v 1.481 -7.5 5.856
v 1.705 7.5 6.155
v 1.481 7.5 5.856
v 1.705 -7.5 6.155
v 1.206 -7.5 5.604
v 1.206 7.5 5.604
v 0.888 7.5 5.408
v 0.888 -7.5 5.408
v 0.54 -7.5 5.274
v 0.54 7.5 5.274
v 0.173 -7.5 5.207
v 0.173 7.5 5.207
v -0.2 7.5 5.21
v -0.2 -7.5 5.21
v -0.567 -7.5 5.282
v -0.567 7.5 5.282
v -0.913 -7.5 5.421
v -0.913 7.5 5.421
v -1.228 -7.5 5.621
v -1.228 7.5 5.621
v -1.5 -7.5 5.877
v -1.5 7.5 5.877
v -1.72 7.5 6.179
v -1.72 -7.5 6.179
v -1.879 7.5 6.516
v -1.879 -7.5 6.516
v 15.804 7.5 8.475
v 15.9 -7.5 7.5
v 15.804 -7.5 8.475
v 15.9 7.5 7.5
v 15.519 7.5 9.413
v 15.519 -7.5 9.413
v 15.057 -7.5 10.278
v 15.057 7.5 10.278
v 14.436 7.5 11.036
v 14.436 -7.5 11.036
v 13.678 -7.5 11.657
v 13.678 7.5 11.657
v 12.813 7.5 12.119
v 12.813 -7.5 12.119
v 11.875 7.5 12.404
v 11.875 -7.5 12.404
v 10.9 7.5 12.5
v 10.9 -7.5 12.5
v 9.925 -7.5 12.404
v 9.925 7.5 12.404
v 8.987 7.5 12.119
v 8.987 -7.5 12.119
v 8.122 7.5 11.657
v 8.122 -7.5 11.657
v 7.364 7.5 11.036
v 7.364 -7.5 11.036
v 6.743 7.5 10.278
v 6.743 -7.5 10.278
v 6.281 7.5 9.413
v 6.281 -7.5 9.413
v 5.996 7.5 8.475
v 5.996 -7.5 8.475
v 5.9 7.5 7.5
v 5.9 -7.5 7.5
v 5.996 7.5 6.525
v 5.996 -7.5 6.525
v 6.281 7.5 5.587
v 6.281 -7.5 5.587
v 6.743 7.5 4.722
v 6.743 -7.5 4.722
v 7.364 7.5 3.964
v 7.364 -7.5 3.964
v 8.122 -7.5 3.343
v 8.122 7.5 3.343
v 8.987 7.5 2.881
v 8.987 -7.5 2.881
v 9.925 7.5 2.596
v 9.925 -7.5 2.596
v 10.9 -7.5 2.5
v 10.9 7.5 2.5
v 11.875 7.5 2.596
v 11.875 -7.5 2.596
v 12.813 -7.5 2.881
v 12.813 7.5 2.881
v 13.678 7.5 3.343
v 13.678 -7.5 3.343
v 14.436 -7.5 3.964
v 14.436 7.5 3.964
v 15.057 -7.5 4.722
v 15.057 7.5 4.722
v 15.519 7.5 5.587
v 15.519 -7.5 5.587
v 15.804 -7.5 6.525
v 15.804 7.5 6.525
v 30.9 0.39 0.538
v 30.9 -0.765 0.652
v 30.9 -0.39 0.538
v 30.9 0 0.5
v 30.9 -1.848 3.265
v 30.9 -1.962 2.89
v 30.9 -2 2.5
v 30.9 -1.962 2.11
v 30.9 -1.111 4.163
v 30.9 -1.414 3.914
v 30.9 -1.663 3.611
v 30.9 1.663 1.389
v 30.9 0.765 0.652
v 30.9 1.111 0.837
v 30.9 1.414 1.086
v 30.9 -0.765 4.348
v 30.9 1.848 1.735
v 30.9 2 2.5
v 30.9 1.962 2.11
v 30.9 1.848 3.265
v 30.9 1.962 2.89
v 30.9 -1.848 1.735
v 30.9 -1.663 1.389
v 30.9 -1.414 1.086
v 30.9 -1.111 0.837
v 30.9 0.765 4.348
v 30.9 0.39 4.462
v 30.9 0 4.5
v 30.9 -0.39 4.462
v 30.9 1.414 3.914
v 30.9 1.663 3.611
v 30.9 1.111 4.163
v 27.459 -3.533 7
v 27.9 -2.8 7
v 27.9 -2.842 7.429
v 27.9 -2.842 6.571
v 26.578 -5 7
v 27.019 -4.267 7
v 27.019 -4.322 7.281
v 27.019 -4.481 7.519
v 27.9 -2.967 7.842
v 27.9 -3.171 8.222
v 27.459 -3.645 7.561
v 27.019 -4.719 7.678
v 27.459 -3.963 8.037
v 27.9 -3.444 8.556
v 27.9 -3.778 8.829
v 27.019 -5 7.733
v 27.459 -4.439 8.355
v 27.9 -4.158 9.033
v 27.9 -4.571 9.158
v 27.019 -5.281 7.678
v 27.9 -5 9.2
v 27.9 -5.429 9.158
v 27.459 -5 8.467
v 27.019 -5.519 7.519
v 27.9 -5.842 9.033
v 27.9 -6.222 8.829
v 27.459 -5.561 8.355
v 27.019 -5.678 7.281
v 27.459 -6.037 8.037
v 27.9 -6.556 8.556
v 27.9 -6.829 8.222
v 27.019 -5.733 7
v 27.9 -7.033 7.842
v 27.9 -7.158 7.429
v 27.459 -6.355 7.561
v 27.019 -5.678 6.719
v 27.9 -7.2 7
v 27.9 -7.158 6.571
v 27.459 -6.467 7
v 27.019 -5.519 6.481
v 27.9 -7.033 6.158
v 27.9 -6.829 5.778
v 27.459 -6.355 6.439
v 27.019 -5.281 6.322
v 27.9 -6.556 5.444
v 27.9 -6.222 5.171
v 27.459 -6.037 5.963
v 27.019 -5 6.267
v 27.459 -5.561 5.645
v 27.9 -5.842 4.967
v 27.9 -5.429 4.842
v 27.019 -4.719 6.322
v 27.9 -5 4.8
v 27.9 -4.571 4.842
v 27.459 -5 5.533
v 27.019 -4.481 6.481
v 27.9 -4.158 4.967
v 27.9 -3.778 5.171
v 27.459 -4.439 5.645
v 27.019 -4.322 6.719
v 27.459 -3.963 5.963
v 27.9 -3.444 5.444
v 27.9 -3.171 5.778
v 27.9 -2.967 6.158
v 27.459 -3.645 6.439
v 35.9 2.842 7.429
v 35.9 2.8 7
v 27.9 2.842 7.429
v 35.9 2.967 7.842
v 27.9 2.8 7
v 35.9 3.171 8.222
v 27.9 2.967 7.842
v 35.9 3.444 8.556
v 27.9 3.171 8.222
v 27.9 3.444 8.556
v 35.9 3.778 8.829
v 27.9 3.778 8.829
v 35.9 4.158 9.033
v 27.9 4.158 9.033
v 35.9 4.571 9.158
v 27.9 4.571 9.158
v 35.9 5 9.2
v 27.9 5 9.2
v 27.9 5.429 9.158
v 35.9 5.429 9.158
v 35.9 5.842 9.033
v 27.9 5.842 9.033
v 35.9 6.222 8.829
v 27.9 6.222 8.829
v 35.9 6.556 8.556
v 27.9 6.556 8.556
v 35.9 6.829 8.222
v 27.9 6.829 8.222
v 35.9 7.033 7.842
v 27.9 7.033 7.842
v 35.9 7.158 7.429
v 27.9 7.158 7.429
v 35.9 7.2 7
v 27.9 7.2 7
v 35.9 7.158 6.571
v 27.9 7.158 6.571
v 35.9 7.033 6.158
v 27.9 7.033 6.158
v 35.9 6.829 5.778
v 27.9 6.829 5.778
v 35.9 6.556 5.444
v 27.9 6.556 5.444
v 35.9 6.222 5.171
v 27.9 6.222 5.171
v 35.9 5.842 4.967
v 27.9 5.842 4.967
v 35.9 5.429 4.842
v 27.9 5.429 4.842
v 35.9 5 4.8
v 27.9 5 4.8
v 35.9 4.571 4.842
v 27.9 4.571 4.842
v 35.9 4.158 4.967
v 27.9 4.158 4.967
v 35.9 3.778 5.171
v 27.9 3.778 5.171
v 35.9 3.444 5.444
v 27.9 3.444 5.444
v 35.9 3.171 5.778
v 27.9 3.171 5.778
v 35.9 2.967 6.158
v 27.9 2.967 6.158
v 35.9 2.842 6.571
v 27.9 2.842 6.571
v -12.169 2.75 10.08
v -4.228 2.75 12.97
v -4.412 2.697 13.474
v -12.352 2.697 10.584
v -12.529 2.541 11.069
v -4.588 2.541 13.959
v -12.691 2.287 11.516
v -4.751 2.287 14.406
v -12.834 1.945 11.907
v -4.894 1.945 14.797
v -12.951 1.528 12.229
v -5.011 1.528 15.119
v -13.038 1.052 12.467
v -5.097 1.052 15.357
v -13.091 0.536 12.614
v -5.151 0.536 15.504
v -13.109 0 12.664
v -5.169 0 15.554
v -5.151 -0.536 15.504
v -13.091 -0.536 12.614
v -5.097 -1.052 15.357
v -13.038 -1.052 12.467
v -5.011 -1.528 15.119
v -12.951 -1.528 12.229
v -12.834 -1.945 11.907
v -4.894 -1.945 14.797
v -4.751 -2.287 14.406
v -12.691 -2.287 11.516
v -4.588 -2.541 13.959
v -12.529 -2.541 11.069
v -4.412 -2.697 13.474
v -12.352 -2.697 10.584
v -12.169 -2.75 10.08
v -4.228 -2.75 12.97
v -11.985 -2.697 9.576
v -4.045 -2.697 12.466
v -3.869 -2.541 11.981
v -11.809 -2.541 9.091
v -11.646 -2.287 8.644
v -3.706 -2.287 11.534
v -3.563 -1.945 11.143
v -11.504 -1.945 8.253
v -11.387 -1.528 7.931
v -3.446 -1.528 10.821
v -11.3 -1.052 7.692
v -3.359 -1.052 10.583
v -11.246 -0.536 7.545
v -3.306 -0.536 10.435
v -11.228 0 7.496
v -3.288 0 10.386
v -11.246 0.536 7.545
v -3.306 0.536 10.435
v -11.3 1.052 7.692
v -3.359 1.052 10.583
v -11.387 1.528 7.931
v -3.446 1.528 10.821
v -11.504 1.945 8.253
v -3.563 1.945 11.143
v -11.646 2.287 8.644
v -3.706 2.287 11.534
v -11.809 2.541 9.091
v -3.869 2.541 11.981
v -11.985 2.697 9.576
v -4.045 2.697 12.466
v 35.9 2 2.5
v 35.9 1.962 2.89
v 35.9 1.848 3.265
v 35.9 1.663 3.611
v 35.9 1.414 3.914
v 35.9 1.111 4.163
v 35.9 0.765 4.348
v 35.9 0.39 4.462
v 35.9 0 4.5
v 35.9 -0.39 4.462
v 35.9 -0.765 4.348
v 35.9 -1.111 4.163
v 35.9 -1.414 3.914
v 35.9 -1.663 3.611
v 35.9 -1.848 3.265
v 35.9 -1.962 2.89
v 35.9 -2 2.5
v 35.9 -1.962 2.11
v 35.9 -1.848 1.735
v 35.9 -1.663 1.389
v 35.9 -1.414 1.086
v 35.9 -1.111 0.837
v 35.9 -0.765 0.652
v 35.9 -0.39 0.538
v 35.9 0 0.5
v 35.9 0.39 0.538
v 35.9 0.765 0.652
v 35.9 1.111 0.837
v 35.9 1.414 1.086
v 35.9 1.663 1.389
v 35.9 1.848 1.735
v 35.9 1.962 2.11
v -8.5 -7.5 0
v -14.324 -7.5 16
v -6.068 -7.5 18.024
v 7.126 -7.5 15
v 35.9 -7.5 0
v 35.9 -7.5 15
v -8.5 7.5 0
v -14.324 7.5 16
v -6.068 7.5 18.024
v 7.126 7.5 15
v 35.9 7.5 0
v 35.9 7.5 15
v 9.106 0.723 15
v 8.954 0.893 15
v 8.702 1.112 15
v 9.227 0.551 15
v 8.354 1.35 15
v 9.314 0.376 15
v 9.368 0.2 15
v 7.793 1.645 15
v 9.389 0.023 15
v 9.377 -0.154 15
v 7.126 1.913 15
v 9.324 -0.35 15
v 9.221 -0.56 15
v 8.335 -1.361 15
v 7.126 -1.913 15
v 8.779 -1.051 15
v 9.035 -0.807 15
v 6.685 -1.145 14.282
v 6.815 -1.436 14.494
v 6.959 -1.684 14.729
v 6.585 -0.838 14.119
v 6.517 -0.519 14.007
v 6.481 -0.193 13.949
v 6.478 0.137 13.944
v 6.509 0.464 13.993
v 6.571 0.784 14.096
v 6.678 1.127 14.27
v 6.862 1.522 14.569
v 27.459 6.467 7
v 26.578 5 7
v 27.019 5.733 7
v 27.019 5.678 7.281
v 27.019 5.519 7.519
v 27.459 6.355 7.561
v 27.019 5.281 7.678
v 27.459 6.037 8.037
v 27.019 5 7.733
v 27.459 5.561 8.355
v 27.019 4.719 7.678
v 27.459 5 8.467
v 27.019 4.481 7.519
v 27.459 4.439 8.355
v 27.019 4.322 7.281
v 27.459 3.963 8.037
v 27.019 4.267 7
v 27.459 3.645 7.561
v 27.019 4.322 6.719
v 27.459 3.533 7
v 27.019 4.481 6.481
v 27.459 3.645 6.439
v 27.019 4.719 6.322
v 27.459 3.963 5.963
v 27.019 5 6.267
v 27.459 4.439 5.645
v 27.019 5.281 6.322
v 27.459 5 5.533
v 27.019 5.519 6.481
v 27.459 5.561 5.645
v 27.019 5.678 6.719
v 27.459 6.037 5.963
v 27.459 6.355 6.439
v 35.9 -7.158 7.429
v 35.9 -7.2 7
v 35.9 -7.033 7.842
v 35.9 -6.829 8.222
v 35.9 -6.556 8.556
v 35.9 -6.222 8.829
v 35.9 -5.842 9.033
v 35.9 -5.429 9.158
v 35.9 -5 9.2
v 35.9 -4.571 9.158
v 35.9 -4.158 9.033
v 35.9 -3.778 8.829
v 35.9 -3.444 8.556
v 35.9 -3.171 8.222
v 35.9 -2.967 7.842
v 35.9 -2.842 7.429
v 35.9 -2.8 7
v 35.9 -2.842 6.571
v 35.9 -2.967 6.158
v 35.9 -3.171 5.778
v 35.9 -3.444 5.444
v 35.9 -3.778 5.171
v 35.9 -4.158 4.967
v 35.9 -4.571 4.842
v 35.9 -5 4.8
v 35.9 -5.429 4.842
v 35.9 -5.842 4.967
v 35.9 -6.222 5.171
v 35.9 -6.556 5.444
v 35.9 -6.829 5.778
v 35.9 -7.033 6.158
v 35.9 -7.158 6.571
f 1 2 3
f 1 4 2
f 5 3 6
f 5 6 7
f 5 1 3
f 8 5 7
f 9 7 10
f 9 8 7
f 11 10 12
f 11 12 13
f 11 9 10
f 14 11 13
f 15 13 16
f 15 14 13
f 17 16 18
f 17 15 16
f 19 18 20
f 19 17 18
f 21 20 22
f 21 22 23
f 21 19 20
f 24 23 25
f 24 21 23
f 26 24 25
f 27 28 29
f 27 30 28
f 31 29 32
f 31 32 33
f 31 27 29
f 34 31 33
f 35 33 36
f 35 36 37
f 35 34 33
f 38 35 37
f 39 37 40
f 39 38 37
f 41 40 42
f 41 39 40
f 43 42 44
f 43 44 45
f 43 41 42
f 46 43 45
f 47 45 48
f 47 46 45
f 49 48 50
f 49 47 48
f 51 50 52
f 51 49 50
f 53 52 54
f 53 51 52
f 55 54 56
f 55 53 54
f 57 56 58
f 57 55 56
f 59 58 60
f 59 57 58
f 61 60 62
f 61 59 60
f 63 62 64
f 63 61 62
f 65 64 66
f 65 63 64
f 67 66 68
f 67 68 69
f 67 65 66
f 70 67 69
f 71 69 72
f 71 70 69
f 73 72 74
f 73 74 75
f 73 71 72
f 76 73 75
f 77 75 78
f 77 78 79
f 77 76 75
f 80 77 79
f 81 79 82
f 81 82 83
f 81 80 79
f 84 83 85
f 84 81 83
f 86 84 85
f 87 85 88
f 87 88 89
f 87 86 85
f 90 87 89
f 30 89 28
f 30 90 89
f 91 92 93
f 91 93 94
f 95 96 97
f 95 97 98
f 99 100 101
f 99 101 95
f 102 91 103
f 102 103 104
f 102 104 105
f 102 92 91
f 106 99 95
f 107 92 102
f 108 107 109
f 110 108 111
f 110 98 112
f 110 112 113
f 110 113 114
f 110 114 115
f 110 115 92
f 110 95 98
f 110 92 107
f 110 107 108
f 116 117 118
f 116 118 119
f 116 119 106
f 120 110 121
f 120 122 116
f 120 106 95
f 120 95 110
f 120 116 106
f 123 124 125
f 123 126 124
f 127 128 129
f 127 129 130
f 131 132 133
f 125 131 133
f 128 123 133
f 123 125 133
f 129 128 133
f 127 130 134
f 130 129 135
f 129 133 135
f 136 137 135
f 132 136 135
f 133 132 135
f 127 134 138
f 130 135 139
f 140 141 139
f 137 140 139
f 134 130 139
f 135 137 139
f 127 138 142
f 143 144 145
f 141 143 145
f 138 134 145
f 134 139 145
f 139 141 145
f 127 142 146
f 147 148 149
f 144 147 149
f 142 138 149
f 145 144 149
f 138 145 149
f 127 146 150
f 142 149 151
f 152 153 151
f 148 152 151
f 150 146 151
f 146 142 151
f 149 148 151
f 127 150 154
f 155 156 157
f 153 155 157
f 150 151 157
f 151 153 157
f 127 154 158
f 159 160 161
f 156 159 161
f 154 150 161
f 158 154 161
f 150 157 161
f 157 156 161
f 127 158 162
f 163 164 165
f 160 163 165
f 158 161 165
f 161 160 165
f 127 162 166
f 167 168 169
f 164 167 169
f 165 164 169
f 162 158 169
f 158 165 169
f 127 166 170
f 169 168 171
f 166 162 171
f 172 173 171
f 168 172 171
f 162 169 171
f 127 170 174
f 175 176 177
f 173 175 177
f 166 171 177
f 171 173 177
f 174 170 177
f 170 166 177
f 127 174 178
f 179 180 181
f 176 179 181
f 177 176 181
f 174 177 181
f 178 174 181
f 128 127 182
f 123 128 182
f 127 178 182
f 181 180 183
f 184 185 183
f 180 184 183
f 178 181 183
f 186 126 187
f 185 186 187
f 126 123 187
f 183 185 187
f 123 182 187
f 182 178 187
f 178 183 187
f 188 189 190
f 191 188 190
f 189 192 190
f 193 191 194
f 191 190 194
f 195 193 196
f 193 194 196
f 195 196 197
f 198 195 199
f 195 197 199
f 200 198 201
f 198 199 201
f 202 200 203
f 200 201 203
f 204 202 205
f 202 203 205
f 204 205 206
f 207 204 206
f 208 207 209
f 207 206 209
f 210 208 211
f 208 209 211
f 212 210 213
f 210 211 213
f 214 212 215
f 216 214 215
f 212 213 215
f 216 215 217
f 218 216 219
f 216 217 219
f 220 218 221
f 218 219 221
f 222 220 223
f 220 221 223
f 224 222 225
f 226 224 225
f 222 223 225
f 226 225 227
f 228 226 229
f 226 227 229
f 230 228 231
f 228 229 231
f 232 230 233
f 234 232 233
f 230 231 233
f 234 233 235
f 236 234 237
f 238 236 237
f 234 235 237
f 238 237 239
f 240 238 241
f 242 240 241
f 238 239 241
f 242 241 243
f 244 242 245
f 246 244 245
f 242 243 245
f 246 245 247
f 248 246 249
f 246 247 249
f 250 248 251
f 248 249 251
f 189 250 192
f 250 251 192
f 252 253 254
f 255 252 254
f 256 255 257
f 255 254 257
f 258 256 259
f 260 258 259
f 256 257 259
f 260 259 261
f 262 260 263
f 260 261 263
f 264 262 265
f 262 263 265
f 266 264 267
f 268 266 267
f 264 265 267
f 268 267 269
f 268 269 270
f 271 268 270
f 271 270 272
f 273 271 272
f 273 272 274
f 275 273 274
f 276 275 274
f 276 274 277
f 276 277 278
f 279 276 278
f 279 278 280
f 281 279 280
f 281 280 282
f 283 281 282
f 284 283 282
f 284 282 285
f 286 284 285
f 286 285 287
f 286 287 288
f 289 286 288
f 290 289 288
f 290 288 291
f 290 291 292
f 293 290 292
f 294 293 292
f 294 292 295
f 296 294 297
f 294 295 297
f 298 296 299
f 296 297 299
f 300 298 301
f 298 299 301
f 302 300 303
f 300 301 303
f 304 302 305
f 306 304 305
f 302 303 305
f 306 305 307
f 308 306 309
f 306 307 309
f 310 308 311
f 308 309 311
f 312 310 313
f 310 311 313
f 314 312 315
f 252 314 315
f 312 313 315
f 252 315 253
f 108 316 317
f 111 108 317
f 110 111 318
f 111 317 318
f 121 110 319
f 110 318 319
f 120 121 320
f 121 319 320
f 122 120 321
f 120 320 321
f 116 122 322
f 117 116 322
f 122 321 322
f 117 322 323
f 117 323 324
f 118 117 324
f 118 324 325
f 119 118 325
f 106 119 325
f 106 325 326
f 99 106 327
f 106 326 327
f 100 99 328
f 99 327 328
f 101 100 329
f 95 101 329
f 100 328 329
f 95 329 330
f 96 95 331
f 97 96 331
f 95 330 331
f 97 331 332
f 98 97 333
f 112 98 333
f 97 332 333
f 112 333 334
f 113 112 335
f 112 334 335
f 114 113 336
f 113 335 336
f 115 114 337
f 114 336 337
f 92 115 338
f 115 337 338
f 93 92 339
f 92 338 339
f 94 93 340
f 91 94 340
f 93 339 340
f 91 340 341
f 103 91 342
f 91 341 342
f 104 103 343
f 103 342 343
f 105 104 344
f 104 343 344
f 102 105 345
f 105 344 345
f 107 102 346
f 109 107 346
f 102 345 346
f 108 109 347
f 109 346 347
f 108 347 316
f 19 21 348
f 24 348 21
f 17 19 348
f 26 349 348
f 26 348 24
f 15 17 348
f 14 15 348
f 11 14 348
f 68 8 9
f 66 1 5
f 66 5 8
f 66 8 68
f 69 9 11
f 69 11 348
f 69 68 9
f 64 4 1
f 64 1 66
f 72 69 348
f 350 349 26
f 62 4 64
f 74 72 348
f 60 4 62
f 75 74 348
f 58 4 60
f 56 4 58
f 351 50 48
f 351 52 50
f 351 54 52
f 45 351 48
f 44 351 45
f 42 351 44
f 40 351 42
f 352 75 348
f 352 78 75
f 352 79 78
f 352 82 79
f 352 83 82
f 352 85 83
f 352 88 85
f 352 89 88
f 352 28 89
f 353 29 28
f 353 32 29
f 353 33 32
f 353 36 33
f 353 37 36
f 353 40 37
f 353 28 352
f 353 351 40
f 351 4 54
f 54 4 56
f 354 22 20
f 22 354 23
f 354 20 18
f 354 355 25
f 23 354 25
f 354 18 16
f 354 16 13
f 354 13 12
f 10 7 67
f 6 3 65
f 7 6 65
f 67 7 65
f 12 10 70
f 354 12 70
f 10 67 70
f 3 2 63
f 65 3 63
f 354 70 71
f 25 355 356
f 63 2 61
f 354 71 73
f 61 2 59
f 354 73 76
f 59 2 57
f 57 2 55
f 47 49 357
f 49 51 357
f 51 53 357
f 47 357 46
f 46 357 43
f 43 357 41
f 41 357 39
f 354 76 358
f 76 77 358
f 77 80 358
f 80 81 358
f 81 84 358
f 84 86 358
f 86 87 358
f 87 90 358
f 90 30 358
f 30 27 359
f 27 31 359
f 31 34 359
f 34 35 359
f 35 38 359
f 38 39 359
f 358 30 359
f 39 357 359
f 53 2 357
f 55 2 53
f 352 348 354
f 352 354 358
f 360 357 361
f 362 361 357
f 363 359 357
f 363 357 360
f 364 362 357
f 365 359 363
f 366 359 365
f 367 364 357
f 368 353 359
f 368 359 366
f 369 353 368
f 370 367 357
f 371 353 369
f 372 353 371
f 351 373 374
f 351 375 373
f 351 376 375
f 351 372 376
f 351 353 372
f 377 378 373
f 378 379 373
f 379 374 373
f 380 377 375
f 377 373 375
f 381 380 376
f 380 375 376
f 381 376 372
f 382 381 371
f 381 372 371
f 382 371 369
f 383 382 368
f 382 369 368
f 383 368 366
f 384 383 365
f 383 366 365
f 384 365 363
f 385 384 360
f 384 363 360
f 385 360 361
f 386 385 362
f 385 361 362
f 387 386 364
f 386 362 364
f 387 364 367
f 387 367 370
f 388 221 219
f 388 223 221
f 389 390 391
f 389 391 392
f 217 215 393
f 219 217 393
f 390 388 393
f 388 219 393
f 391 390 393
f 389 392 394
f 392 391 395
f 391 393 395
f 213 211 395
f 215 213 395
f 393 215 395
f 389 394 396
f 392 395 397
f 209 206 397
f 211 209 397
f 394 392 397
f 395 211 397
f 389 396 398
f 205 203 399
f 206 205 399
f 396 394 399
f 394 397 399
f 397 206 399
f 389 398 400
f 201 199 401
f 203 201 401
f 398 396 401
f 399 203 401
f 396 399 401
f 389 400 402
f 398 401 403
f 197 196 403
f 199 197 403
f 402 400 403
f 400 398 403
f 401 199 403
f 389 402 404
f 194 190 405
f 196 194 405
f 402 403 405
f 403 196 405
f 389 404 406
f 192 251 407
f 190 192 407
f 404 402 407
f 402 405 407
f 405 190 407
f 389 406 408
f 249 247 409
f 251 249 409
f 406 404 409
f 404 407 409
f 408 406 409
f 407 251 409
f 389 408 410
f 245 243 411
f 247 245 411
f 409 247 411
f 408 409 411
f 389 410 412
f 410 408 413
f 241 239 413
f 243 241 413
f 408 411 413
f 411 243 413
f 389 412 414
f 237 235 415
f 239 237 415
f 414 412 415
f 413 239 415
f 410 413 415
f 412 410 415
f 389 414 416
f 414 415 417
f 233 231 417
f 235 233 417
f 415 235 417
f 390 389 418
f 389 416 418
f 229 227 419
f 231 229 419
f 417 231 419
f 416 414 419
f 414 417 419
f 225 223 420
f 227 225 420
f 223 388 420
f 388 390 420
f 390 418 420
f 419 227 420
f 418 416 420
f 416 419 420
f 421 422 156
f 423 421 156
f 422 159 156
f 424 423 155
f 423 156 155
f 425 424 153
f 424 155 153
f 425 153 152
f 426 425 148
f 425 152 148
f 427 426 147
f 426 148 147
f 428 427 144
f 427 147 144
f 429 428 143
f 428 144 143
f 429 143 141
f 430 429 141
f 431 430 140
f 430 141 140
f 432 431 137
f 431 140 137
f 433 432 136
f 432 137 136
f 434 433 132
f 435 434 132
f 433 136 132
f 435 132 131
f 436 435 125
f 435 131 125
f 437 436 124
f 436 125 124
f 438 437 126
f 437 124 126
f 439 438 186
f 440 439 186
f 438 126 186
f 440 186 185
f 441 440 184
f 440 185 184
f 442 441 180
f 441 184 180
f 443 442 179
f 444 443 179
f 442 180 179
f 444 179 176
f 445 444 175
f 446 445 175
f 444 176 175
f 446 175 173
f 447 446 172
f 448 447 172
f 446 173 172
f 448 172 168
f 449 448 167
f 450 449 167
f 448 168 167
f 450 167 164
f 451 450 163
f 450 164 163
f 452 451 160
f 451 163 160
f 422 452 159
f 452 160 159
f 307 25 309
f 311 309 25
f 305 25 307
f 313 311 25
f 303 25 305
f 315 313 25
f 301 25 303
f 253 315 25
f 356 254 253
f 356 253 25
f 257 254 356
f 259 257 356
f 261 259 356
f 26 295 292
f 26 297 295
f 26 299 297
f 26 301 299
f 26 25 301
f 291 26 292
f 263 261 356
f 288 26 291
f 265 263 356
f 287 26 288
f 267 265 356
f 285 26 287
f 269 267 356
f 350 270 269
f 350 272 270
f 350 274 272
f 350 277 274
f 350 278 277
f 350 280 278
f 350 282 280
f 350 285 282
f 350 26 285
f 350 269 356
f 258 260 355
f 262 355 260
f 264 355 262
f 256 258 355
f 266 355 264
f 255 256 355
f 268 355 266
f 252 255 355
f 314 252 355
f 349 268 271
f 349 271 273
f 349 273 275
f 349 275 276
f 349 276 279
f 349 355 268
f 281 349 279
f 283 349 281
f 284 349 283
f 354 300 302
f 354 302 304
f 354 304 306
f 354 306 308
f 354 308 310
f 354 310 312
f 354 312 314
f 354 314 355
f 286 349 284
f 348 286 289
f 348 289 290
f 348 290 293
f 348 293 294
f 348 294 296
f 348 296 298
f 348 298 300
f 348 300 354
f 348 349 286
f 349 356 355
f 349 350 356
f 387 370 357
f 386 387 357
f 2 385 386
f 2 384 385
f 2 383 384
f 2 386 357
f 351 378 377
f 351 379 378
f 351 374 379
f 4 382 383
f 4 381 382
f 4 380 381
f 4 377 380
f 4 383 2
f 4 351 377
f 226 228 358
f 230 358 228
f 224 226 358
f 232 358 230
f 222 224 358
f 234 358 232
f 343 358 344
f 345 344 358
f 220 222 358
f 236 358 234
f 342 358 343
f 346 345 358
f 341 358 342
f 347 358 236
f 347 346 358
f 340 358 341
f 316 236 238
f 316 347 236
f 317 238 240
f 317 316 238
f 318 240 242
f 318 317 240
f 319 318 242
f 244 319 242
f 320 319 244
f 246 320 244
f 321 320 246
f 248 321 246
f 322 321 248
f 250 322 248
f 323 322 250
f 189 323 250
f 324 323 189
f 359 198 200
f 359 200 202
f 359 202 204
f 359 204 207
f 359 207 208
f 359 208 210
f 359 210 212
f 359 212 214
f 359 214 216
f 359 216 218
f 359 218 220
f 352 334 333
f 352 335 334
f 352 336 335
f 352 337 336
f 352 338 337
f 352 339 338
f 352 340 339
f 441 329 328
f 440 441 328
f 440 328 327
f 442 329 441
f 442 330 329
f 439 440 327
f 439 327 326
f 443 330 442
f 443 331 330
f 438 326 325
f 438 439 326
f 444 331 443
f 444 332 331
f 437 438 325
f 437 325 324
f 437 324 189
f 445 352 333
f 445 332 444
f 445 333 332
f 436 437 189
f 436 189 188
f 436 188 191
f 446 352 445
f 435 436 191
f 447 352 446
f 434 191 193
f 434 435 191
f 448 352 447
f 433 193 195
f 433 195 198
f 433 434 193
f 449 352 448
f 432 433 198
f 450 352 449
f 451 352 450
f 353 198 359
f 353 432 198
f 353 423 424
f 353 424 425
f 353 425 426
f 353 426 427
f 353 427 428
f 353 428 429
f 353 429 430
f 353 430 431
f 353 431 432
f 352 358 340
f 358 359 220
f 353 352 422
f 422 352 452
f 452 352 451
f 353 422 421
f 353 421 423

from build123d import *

# Parameters (mm, degrees)
F0_R     = 5
F1_DEPTH = 7.5
F3_D     = 5.5
F4_R     = 2
F5_DEPTH = 5
F6_D     = 4.4
F6_DEPTH = 8
F6_TIP   = 1.3218933619


with BuildPart() as f1:
    # F0 (on Front) → F1 (new body, symmetric)
    with BuildSketch(Plane.XZ):
        with BuildLine():
            Line((-14.3235237483, 16), (-8.5, 0))
            Line((-8.5, 0), (35.9, 0))
            Line((35.9, 0), (35.9, 15))
            Line((35.9, 15), (7.1255015407, 15))
            Line((7.1255015407, 15), (1.7052803287, 6.1550028706))
            ThreePointArc((1.7052803287, 6.1550028706), (-0.2003761232, 5.2100629635), (-1.8793852416, 6.5159597133))
            Line((-1.8793852416, 6.5159597133), (-6.0681093439, 18.0243846007))
            Line((-6.0681093439, 18.0243846007), (-14.3235237483, 16))
        make_face()
        with Locations((10.9, 7.5)):
            Circle(F0_R, mode=Mode.SUBTRACT)
    extrude(amount=F1_DEPTH, both=True)

    # F3 (through all)
    with Locations(Plane(origin=(-7.5056888833, 0, -2.7318473412), x_dir=(0, -1, 0), z_dir=(-0.9396926208, 0, -0.3420201433))):
        with Locations((0, 13.6340155779)):
            Hole(F3_D / 2)

    # F4 (on face) → F5 (cut)
    with BuildSketch(Plane.YZ.offset(35.9)):
        with Locations((0, 2.5)):
            Circle(F4_R)
    extrude(amount=-F5_DEPTH, mode=Mode.SUBTRACT)

    # F6
    with Locations(Plane.YZ.offset(35.9)):
        with Locations((-5, 7), (5, 7)):
            Hole(F6_D / 2, depth=F6_DEPTH)
            with Locations((0, 0, -(F6_DEPTH + F6_TIP / 2))):  # 118° drill point
                Cone(0, F6_D / 2, F6_TIP, mode=Mode.SUBTRACT)


solid = f1.part
